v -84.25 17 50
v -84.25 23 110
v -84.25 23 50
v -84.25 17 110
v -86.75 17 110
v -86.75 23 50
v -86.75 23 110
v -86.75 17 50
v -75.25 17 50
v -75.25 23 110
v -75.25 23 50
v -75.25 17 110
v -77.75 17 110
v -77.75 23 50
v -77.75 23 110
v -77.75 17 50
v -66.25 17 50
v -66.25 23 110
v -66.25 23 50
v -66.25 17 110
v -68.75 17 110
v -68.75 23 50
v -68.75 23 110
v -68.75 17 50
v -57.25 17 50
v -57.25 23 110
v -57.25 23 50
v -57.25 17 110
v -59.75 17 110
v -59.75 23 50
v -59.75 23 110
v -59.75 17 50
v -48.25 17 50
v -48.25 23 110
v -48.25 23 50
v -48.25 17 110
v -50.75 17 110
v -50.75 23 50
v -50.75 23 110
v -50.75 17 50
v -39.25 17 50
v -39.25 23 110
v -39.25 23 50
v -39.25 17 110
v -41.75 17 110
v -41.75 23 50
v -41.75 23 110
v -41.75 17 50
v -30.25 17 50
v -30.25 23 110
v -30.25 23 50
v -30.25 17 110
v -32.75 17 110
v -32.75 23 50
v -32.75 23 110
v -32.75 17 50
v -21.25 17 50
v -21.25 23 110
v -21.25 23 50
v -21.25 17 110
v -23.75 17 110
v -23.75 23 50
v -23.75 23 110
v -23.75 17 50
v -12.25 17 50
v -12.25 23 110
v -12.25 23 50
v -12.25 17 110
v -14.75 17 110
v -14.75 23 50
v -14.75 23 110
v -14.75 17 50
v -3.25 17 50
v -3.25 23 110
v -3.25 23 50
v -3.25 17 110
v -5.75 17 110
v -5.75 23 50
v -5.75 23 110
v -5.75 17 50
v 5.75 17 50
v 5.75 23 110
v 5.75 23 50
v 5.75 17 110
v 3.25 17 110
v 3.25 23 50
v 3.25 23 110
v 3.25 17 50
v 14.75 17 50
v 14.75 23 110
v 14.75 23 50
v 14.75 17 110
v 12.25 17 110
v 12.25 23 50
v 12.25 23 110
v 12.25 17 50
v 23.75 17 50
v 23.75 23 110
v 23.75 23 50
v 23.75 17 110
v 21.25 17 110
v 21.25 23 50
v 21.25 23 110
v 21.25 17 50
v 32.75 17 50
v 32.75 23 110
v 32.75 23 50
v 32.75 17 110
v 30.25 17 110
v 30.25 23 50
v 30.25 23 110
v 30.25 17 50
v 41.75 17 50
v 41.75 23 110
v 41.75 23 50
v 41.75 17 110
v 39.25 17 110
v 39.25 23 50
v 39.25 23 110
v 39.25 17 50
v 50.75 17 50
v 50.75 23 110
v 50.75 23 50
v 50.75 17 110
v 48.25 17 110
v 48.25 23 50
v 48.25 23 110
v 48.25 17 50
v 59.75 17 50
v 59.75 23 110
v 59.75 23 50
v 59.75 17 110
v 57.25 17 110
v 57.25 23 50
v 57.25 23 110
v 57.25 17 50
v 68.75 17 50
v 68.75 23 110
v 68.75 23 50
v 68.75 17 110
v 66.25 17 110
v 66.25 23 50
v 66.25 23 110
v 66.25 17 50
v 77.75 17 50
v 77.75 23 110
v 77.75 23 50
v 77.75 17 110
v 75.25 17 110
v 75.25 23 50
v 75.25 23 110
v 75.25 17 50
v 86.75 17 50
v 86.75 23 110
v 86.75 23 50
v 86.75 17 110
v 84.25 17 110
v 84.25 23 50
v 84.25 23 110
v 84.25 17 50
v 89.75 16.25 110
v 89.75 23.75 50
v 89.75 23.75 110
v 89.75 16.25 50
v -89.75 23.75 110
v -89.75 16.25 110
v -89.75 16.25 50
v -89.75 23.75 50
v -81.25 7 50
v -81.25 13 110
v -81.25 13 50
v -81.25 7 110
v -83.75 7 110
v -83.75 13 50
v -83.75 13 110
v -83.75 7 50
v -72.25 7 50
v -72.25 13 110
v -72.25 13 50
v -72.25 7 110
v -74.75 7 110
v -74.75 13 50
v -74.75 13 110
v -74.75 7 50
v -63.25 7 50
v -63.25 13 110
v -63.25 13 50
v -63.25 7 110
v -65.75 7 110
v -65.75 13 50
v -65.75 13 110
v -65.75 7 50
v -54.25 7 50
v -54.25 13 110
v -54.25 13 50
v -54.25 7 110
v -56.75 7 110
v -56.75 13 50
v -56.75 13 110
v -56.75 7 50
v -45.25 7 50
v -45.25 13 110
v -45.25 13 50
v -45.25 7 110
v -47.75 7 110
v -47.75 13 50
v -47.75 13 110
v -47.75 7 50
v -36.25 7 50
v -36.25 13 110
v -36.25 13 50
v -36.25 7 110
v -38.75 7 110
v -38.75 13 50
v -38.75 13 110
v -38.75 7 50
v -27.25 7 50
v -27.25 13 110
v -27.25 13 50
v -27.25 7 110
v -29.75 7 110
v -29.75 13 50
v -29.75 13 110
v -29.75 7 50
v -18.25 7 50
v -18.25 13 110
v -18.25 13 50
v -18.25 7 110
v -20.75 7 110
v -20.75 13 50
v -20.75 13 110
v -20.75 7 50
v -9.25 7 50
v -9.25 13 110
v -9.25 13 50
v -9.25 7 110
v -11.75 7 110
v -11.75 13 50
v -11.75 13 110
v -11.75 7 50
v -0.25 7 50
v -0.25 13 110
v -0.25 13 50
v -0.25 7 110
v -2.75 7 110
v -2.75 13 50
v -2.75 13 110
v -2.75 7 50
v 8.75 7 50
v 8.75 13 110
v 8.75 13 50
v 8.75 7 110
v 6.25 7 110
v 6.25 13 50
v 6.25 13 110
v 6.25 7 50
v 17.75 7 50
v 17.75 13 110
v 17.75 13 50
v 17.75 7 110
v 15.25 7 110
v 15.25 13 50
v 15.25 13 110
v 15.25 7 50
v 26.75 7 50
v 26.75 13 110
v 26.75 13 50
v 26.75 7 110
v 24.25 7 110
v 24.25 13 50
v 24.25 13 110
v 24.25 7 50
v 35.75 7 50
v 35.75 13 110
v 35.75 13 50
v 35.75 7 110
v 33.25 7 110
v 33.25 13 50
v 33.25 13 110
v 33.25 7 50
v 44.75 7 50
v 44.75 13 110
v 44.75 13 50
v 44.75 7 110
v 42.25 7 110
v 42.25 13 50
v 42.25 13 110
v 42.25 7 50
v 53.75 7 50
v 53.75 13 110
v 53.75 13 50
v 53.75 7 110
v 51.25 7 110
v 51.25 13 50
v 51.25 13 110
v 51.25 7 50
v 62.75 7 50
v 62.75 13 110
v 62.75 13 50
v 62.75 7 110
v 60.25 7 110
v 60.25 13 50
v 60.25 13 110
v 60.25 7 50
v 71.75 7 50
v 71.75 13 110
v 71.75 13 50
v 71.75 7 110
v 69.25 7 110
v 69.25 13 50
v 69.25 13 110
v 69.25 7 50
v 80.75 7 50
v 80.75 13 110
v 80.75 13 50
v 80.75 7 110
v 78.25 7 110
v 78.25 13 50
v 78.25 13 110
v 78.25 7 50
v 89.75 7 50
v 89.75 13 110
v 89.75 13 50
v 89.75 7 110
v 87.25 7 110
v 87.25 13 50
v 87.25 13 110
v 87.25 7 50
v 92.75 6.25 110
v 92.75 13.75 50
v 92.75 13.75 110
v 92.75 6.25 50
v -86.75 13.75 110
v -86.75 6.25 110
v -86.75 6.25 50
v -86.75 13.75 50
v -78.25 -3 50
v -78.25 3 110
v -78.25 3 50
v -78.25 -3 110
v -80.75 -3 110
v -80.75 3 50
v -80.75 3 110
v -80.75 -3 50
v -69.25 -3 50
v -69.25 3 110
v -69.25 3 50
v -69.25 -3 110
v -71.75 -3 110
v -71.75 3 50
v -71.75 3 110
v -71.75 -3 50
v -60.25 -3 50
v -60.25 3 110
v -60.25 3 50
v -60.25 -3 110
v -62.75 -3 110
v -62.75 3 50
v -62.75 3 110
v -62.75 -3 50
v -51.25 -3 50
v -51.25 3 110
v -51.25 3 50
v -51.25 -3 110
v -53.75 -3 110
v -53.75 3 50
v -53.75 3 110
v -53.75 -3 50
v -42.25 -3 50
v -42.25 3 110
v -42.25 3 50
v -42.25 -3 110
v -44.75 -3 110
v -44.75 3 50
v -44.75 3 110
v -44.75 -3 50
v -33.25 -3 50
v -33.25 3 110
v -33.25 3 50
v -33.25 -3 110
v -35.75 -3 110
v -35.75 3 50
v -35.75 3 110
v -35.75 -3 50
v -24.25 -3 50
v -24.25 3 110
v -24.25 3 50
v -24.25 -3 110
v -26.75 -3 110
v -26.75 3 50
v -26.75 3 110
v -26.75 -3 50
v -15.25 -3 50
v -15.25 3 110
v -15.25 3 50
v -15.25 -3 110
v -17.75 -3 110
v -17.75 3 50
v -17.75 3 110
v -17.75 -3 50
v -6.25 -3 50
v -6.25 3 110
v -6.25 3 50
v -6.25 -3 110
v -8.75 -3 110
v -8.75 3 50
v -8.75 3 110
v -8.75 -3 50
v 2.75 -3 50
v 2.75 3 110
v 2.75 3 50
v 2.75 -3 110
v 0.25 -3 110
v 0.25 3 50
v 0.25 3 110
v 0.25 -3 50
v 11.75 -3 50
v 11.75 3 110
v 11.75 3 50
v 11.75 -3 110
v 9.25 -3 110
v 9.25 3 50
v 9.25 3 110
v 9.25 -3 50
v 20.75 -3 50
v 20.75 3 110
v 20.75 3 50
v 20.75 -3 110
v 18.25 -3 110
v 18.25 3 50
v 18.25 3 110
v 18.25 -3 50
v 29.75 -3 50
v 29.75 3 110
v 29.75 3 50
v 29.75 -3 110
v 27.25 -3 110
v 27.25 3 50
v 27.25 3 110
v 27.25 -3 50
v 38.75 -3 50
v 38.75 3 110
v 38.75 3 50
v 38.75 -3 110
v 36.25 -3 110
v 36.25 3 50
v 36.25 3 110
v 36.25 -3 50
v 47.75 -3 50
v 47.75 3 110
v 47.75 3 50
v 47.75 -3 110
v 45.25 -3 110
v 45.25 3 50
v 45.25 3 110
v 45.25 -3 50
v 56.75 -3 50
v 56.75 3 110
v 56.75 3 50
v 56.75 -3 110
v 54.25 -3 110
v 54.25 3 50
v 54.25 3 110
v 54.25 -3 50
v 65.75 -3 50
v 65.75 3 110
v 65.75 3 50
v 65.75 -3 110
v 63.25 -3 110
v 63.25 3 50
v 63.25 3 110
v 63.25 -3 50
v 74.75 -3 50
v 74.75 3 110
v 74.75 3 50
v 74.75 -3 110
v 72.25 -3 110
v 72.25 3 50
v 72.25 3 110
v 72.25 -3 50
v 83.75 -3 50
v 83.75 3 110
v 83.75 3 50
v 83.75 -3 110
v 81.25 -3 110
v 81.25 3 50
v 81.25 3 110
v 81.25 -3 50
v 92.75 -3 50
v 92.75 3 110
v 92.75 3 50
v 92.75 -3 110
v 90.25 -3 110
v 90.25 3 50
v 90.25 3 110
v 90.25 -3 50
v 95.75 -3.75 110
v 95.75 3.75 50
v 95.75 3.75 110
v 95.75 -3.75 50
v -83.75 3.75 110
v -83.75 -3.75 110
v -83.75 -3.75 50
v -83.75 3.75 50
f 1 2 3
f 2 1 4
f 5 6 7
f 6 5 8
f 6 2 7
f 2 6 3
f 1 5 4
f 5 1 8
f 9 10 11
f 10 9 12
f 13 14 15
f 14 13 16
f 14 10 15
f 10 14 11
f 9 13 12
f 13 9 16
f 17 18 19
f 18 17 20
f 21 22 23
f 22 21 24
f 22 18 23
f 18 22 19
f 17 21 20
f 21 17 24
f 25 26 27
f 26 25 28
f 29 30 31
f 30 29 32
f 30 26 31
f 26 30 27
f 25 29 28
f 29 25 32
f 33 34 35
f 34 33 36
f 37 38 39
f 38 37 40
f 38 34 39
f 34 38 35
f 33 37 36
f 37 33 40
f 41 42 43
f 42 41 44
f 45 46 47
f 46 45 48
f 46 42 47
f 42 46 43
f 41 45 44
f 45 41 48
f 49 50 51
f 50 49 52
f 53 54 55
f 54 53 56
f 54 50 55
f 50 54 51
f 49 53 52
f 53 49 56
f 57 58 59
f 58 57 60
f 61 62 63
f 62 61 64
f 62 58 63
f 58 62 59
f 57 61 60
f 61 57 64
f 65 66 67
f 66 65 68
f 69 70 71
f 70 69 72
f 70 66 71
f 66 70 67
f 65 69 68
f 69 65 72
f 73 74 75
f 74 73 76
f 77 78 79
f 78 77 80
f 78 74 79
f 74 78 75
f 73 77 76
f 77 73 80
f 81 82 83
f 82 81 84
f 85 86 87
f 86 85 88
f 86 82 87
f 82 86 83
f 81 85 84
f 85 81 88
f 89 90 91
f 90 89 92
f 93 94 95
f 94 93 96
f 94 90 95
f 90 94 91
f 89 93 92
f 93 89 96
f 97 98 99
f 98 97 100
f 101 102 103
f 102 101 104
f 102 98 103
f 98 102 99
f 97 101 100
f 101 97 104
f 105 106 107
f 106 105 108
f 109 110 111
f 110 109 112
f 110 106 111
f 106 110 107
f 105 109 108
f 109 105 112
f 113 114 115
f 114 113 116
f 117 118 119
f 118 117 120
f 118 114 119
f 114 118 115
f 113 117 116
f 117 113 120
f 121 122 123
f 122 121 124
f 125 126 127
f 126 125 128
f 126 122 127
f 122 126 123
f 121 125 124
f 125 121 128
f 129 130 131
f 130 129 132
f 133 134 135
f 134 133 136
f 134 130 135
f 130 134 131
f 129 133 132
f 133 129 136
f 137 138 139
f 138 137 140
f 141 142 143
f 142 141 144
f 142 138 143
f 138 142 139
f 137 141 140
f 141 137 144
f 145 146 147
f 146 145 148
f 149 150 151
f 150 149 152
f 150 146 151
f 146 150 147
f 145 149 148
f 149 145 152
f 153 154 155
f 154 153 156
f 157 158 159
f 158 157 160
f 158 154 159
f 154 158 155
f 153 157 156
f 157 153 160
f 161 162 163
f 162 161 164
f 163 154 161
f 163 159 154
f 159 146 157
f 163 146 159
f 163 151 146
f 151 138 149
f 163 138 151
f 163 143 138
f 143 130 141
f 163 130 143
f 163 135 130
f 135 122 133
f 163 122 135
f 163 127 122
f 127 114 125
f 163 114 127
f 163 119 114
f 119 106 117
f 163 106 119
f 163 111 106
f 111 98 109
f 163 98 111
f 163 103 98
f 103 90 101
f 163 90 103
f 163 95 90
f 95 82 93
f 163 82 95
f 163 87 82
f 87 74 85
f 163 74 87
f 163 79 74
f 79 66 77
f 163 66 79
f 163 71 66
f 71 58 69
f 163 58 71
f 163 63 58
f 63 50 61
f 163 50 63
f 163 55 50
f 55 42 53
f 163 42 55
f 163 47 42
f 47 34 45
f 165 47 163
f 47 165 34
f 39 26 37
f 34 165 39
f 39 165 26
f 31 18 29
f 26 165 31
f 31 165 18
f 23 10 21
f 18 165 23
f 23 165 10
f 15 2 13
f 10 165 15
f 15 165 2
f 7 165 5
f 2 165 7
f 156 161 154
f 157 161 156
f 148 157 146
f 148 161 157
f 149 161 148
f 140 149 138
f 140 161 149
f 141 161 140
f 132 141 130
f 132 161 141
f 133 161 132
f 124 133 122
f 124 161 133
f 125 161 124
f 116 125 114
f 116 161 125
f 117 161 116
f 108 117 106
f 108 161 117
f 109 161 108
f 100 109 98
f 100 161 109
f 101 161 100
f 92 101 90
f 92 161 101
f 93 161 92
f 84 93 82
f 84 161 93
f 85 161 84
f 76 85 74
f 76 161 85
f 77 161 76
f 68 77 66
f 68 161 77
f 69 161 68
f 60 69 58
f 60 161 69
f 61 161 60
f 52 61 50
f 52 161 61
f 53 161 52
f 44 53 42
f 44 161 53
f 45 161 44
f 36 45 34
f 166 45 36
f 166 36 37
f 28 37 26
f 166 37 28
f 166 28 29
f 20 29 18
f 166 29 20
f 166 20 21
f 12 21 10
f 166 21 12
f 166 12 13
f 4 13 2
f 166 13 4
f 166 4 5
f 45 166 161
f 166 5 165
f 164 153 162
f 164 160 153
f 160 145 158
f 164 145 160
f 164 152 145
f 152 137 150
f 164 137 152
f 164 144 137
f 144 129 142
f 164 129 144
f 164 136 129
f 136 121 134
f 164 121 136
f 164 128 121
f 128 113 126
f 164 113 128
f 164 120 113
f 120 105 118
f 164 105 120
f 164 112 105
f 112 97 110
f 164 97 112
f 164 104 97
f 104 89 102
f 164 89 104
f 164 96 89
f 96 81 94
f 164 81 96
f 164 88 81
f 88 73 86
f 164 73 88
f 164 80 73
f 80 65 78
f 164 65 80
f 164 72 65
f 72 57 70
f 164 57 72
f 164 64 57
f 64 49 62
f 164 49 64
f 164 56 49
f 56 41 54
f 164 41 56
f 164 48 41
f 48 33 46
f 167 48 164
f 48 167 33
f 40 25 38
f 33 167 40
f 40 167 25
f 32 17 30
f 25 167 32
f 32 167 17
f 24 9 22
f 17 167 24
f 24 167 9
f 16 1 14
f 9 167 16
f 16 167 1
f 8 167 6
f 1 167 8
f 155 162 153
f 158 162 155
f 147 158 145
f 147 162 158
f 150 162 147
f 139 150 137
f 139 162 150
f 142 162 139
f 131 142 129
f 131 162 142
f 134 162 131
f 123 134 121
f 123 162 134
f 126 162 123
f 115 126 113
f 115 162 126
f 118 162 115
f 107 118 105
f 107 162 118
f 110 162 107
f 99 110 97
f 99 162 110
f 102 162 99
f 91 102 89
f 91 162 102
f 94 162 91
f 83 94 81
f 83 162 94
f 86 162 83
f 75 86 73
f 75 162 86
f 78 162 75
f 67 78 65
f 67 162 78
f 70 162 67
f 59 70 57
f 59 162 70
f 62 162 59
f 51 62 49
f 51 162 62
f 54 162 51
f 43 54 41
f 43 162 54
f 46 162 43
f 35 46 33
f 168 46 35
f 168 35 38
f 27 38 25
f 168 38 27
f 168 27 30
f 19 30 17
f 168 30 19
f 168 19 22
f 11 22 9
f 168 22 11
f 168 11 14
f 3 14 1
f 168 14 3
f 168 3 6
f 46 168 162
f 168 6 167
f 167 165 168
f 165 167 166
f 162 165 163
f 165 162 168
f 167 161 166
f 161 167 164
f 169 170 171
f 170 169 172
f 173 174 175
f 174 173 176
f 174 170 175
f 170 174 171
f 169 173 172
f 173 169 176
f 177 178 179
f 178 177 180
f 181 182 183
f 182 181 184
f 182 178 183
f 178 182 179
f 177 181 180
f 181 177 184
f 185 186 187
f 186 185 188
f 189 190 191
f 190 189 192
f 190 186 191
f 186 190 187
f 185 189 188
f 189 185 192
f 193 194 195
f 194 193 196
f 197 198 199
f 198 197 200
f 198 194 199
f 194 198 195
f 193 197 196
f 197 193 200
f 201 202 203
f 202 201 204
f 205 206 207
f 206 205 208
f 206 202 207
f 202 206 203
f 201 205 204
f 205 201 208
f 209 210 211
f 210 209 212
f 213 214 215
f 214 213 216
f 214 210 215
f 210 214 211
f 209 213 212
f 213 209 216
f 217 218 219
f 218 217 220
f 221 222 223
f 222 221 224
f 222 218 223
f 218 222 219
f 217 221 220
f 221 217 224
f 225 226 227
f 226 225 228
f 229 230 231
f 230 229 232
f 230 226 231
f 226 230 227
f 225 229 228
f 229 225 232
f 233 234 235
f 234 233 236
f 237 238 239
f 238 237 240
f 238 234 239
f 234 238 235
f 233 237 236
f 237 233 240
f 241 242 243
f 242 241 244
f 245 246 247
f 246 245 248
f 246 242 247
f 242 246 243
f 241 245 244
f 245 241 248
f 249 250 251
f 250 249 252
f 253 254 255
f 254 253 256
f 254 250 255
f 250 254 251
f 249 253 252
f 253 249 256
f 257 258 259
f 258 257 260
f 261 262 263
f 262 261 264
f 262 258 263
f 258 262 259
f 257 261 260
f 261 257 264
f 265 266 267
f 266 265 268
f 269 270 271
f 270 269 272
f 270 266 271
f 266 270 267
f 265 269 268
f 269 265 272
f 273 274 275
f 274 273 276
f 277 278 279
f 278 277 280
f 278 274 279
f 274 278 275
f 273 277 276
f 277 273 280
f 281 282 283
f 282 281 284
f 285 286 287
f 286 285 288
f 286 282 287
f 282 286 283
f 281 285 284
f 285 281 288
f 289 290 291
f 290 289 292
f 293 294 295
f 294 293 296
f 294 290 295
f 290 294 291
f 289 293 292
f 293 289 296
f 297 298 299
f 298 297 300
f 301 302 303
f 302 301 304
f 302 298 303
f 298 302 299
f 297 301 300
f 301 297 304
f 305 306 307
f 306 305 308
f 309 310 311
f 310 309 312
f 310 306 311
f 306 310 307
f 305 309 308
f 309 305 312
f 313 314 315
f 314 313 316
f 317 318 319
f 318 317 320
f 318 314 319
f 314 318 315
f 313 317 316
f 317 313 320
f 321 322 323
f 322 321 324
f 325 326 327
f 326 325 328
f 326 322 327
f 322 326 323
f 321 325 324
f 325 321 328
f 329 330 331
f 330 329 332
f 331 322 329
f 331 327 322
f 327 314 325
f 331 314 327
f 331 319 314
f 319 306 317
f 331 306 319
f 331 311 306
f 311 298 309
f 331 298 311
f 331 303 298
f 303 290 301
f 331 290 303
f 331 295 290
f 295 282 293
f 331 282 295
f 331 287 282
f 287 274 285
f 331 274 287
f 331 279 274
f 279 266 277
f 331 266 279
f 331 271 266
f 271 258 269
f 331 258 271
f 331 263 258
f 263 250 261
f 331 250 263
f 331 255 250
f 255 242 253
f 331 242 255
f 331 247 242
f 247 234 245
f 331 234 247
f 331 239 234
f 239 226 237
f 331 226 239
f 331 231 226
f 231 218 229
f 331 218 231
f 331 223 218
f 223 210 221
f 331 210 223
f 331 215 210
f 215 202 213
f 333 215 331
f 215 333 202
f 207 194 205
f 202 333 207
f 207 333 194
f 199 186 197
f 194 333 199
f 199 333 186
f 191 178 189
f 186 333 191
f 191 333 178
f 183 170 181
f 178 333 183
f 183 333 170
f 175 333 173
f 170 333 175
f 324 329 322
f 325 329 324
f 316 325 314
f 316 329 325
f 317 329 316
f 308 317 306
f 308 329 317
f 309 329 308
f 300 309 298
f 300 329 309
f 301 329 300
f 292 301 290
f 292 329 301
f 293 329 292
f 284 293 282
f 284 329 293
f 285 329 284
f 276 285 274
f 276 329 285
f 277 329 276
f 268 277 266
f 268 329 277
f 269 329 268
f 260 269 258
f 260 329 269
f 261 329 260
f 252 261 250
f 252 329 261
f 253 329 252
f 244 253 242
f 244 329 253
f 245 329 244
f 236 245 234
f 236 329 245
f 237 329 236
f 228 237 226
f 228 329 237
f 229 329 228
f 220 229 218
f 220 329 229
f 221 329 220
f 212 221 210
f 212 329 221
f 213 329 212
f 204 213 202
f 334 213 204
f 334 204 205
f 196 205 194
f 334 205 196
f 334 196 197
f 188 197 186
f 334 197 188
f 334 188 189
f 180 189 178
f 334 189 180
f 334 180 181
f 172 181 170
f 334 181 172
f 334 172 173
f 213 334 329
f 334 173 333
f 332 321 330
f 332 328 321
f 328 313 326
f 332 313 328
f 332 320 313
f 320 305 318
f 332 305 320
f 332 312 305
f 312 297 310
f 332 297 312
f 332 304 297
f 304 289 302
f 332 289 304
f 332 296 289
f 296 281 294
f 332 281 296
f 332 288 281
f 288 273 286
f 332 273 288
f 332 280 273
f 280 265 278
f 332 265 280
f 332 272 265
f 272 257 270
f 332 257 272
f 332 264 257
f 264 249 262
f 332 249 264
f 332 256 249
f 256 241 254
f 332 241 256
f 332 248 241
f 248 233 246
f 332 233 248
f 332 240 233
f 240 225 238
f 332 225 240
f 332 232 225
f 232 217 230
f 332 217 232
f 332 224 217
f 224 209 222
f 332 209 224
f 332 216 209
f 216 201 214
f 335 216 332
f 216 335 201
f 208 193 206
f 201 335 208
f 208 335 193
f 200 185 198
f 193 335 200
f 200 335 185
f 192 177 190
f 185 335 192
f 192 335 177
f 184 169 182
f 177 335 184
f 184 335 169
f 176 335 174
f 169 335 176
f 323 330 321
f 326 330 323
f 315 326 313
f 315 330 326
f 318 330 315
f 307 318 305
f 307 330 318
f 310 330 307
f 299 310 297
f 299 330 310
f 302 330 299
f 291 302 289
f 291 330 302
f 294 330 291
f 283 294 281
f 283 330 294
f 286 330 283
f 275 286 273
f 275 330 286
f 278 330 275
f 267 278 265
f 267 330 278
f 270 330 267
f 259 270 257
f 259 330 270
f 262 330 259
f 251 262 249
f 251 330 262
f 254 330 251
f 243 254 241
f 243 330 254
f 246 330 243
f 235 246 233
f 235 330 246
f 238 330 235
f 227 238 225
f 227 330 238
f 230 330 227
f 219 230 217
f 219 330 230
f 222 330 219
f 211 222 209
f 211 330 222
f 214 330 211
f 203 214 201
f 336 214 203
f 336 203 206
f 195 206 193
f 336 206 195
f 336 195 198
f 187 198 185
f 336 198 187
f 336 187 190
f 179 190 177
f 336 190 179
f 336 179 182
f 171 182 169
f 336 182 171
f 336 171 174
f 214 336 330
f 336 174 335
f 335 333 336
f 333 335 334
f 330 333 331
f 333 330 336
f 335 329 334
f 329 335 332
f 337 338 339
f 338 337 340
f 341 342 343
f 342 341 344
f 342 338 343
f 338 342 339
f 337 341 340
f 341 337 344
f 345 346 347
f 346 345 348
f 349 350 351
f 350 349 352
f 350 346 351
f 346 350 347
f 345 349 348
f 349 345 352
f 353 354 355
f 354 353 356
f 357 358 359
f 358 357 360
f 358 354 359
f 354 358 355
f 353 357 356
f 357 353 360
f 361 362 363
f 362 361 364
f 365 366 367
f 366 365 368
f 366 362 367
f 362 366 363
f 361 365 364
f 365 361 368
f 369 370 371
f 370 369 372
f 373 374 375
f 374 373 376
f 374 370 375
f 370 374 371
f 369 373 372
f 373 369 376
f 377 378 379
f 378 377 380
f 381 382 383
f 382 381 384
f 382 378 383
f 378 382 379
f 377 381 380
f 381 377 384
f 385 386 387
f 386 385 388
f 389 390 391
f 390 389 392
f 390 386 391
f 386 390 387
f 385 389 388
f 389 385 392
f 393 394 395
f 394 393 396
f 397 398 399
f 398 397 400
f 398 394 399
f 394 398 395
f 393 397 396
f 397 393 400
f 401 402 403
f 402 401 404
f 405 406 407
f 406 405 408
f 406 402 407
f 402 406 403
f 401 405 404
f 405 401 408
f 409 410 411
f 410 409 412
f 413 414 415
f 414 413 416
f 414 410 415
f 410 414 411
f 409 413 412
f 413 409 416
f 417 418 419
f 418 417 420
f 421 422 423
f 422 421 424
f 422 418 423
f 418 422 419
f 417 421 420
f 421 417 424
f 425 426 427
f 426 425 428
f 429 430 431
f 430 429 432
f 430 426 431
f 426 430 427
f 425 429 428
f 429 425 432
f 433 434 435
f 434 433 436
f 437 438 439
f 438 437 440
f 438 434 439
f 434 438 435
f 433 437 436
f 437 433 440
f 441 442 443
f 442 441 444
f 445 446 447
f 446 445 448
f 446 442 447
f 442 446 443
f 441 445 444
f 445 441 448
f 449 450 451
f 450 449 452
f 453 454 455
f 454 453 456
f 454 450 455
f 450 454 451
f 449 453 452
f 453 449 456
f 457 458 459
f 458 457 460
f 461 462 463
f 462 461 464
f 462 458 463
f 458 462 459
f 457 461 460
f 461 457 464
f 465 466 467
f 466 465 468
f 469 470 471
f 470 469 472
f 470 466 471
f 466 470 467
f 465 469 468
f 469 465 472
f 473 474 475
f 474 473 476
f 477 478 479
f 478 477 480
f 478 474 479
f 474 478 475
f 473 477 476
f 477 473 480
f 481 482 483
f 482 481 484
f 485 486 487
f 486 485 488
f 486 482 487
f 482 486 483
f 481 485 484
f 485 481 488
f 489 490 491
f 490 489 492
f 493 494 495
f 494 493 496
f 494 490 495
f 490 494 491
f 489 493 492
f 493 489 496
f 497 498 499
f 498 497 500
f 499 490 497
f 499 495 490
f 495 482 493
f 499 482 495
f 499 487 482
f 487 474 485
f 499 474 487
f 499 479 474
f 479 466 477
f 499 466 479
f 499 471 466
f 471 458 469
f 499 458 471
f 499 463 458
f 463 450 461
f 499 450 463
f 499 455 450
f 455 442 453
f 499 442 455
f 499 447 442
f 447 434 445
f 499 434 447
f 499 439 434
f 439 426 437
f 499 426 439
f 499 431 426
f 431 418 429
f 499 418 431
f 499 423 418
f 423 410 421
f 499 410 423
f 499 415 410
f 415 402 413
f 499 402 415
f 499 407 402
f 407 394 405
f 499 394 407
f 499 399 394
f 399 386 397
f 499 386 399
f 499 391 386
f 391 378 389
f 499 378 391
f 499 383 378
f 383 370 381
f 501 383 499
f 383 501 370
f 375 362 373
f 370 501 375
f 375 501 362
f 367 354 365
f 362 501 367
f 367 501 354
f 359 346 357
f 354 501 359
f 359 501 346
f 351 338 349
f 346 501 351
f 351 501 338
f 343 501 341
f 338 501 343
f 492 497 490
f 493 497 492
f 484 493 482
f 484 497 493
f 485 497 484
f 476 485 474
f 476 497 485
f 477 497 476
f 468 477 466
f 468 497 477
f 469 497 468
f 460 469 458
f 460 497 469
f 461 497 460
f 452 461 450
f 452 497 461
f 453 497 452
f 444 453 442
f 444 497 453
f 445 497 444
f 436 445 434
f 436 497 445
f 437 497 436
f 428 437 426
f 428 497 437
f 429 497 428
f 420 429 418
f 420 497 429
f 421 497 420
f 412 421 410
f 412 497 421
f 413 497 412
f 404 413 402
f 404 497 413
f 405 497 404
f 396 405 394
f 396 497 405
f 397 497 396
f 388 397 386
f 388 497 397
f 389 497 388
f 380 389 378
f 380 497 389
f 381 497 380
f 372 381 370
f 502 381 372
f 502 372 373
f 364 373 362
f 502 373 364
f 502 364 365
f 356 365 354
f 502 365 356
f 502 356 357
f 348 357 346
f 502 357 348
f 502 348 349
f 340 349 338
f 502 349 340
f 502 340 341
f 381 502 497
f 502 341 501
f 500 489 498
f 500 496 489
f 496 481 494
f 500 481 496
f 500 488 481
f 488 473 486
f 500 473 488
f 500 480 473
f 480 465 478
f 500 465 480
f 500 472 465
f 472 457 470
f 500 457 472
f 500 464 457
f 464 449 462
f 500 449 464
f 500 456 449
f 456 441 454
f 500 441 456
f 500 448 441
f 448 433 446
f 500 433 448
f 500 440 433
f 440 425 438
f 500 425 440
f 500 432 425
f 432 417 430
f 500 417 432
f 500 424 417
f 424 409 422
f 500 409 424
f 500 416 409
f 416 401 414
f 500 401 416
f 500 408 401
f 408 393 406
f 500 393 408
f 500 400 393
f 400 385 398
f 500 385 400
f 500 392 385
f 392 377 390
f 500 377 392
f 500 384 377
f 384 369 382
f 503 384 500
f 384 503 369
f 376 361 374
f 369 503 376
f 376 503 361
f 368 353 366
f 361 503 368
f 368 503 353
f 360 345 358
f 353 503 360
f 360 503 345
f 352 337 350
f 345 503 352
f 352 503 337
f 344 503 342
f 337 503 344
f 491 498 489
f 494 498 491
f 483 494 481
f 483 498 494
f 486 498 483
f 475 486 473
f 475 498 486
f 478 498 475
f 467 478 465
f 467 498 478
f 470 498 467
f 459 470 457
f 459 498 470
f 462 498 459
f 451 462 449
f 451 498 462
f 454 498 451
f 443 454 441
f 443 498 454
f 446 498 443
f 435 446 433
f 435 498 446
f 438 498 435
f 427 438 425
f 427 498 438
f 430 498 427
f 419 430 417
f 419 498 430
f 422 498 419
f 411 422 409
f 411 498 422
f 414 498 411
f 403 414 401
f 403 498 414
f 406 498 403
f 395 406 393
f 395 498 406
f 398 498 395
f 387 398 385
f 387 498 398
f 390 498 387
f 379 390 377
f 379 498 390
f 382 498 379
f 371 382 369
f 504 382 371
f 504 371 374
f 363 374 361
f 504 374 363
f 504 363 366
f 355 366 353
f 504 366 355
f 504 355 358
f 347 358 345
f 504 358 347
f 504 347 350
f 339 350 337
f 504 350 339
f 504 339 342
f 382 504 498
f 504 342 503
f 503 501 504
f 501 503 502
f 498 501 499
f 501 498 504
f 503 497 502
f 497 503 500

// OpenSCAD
/*
 * CHANNEL GUIDE - Comb-Style Lateral Constraint
 *
 * DESIGN:
 * - U-channel comb structure for each layer
 * - Slats slide vertically within channels
 * - Prevents X/Y drift while allowing Z motion
 * - Works with fish wire suspension
 *
 * Each layer has its own guide comb positioned at its Y location.
 * Channels are spaced to match slat X positions with layer offset.
 *
 * Print: 3x (one per layer)
 */

include <../common.scad>

$fn = 24;

// ============================================
// MAIN CHANNEL GUIDE MODULE
// ============================================

module channel_guide(layer = 0) {
    difference() {
        // Main comb body
        comb_body(layer);

        // Cut channels for slats
        slat_channels(layer);
    }
}

// ============================================
// COMB BODY
// ============================================

module comb_body(layer) {
    // Solid block that will have channels cut from it

    // Calculate total width needed
    first_slat_x = slat_x(0, layer);
    last_slat_x = slat_x(NUM_SLATS - 1, layer);

    body_length = last_slat_x - first_slat_x + CHANNEL_WIDTH + CHANNEL_WALL * 4;
    body_center_x = (first_slat_x + last_slat_x) / 2;

    translate([body_center_x, 0, CHANNEL_HEIGHT/2])
        cube([body_length, CHANNEL_DEPTH * 2 + CHANNEL_WALL, CHANNEL_HEIGHT], center = true);
}

// ============================================
// SLAT CHANNELS (cut from comb body)
// ============================================

module slat_channels(layer) {
    for (i = [0 : NUM_SLATS - 1]) {
        x = slat_x(i, layer);

        // U-channel cut-out
        translate([x, 0, CHANNEL_HEIGHT/2])
            cube([CHANNEL_WIDTH, CHANNEL_DEPTH * 2, CHANNEL_HEIGHT + 1], center = true);
    }
}

// ============================================
// SINGLE U-CHANNEL (for visualization)
// ============================================

module single_channel() {
    difference() {
        // Channel walls
        cube([CHANNEL_WIDTH + CHANNEL_WALL * 2, CHANNEL_DEPTH * 2 + CHANNEL_WALL, CHANNEL_HEIGHT], center = true);

        // Channel opening
        translate([0, CHANNEL_WALL/2, 0])
            cube([CHANNEL_WIDTH, CHANNEL_DEPTH * 2, CHANNEL_HEIGHT + 1], center = true);
    }
}

// ============================================
// MOUNTING TABS
// ============================================

module guide_with_mounting(layer = 0) {
    union() {
        channel_guide(layer);

        // Mounting tabs at ends
        first_x = slat_x(0, layer);
        last_x = slat_x(NUM_SLATS - 1, layer);

        for (x = [first_x - 15, last_x + 15]) {
            translate([x, 0, CHANNEL_HEIGHT/2])
            difference() {
                cube([10, CHANNEL_DEPTH * 2 + CHANNEL_WALL + 10, 8], center = true);

                // Mounting hole
                cylinder(d = M4_HOLE, h = 10, center = true);
            }
        }
    }
}

// ============================================
// RENDER - Show all 3 guides at layer positions
// ============================================

for (L = [0 : NUM_LAYERS - 1]) {
    translate([0, LAYER_Y_CENTER[L], 50])
    color(C_GUIDE)
        channel_guide(L);
}

// Show sample slats in channels (transparent)
for (L = [0 : NUM_LAYERS - 1]) {
    for (i = [0, 5, 10, 15, 19]) {
        x = slat_x(i, L);
        z_base = 50 + 5;  // Guide Z + some offset

        %translate([x, LAYER_Y_CENTER[L], z_base])
        color(slat_color(L))
            cube([SLAT_THICKNESS, SLAT_DEPTH, 30], center = true);
    }
}

// ============================================
// INFO
// ============================================

echo("=== CHANNEL GUIDE ===");
echo(str("Channel width: ", CHANNEL_WIDTH, "mm (slat ", SLAT_THICKNESS, "mm + ", CHANNEL_WIDTH - SLAT_THICKNESS, "mm clearance)"));
echo(str("Channel depth: ", CHANNEL_DEPTH, "mm"));
echo(str("Channel height: ", CHANNEL_HEIGHT, "mm"));
echo(str("Channels per guide: ", NUM_SLATS));
echo("");
echo("LAYER POSITIONS:");
echo(str("  Layer 0 guide: Y=", LAYER_Y_CENTER[0], "mm"));
echo(str("  Layer 1 guide: Y=", LAYER_Y_CENTER[1], "mm"));
echo(str("  Layer 2 guide: Y=", LAYER_Y_CENTER[2], "mm"));
echo("");
echo("Print: 3x (one per layer)");
